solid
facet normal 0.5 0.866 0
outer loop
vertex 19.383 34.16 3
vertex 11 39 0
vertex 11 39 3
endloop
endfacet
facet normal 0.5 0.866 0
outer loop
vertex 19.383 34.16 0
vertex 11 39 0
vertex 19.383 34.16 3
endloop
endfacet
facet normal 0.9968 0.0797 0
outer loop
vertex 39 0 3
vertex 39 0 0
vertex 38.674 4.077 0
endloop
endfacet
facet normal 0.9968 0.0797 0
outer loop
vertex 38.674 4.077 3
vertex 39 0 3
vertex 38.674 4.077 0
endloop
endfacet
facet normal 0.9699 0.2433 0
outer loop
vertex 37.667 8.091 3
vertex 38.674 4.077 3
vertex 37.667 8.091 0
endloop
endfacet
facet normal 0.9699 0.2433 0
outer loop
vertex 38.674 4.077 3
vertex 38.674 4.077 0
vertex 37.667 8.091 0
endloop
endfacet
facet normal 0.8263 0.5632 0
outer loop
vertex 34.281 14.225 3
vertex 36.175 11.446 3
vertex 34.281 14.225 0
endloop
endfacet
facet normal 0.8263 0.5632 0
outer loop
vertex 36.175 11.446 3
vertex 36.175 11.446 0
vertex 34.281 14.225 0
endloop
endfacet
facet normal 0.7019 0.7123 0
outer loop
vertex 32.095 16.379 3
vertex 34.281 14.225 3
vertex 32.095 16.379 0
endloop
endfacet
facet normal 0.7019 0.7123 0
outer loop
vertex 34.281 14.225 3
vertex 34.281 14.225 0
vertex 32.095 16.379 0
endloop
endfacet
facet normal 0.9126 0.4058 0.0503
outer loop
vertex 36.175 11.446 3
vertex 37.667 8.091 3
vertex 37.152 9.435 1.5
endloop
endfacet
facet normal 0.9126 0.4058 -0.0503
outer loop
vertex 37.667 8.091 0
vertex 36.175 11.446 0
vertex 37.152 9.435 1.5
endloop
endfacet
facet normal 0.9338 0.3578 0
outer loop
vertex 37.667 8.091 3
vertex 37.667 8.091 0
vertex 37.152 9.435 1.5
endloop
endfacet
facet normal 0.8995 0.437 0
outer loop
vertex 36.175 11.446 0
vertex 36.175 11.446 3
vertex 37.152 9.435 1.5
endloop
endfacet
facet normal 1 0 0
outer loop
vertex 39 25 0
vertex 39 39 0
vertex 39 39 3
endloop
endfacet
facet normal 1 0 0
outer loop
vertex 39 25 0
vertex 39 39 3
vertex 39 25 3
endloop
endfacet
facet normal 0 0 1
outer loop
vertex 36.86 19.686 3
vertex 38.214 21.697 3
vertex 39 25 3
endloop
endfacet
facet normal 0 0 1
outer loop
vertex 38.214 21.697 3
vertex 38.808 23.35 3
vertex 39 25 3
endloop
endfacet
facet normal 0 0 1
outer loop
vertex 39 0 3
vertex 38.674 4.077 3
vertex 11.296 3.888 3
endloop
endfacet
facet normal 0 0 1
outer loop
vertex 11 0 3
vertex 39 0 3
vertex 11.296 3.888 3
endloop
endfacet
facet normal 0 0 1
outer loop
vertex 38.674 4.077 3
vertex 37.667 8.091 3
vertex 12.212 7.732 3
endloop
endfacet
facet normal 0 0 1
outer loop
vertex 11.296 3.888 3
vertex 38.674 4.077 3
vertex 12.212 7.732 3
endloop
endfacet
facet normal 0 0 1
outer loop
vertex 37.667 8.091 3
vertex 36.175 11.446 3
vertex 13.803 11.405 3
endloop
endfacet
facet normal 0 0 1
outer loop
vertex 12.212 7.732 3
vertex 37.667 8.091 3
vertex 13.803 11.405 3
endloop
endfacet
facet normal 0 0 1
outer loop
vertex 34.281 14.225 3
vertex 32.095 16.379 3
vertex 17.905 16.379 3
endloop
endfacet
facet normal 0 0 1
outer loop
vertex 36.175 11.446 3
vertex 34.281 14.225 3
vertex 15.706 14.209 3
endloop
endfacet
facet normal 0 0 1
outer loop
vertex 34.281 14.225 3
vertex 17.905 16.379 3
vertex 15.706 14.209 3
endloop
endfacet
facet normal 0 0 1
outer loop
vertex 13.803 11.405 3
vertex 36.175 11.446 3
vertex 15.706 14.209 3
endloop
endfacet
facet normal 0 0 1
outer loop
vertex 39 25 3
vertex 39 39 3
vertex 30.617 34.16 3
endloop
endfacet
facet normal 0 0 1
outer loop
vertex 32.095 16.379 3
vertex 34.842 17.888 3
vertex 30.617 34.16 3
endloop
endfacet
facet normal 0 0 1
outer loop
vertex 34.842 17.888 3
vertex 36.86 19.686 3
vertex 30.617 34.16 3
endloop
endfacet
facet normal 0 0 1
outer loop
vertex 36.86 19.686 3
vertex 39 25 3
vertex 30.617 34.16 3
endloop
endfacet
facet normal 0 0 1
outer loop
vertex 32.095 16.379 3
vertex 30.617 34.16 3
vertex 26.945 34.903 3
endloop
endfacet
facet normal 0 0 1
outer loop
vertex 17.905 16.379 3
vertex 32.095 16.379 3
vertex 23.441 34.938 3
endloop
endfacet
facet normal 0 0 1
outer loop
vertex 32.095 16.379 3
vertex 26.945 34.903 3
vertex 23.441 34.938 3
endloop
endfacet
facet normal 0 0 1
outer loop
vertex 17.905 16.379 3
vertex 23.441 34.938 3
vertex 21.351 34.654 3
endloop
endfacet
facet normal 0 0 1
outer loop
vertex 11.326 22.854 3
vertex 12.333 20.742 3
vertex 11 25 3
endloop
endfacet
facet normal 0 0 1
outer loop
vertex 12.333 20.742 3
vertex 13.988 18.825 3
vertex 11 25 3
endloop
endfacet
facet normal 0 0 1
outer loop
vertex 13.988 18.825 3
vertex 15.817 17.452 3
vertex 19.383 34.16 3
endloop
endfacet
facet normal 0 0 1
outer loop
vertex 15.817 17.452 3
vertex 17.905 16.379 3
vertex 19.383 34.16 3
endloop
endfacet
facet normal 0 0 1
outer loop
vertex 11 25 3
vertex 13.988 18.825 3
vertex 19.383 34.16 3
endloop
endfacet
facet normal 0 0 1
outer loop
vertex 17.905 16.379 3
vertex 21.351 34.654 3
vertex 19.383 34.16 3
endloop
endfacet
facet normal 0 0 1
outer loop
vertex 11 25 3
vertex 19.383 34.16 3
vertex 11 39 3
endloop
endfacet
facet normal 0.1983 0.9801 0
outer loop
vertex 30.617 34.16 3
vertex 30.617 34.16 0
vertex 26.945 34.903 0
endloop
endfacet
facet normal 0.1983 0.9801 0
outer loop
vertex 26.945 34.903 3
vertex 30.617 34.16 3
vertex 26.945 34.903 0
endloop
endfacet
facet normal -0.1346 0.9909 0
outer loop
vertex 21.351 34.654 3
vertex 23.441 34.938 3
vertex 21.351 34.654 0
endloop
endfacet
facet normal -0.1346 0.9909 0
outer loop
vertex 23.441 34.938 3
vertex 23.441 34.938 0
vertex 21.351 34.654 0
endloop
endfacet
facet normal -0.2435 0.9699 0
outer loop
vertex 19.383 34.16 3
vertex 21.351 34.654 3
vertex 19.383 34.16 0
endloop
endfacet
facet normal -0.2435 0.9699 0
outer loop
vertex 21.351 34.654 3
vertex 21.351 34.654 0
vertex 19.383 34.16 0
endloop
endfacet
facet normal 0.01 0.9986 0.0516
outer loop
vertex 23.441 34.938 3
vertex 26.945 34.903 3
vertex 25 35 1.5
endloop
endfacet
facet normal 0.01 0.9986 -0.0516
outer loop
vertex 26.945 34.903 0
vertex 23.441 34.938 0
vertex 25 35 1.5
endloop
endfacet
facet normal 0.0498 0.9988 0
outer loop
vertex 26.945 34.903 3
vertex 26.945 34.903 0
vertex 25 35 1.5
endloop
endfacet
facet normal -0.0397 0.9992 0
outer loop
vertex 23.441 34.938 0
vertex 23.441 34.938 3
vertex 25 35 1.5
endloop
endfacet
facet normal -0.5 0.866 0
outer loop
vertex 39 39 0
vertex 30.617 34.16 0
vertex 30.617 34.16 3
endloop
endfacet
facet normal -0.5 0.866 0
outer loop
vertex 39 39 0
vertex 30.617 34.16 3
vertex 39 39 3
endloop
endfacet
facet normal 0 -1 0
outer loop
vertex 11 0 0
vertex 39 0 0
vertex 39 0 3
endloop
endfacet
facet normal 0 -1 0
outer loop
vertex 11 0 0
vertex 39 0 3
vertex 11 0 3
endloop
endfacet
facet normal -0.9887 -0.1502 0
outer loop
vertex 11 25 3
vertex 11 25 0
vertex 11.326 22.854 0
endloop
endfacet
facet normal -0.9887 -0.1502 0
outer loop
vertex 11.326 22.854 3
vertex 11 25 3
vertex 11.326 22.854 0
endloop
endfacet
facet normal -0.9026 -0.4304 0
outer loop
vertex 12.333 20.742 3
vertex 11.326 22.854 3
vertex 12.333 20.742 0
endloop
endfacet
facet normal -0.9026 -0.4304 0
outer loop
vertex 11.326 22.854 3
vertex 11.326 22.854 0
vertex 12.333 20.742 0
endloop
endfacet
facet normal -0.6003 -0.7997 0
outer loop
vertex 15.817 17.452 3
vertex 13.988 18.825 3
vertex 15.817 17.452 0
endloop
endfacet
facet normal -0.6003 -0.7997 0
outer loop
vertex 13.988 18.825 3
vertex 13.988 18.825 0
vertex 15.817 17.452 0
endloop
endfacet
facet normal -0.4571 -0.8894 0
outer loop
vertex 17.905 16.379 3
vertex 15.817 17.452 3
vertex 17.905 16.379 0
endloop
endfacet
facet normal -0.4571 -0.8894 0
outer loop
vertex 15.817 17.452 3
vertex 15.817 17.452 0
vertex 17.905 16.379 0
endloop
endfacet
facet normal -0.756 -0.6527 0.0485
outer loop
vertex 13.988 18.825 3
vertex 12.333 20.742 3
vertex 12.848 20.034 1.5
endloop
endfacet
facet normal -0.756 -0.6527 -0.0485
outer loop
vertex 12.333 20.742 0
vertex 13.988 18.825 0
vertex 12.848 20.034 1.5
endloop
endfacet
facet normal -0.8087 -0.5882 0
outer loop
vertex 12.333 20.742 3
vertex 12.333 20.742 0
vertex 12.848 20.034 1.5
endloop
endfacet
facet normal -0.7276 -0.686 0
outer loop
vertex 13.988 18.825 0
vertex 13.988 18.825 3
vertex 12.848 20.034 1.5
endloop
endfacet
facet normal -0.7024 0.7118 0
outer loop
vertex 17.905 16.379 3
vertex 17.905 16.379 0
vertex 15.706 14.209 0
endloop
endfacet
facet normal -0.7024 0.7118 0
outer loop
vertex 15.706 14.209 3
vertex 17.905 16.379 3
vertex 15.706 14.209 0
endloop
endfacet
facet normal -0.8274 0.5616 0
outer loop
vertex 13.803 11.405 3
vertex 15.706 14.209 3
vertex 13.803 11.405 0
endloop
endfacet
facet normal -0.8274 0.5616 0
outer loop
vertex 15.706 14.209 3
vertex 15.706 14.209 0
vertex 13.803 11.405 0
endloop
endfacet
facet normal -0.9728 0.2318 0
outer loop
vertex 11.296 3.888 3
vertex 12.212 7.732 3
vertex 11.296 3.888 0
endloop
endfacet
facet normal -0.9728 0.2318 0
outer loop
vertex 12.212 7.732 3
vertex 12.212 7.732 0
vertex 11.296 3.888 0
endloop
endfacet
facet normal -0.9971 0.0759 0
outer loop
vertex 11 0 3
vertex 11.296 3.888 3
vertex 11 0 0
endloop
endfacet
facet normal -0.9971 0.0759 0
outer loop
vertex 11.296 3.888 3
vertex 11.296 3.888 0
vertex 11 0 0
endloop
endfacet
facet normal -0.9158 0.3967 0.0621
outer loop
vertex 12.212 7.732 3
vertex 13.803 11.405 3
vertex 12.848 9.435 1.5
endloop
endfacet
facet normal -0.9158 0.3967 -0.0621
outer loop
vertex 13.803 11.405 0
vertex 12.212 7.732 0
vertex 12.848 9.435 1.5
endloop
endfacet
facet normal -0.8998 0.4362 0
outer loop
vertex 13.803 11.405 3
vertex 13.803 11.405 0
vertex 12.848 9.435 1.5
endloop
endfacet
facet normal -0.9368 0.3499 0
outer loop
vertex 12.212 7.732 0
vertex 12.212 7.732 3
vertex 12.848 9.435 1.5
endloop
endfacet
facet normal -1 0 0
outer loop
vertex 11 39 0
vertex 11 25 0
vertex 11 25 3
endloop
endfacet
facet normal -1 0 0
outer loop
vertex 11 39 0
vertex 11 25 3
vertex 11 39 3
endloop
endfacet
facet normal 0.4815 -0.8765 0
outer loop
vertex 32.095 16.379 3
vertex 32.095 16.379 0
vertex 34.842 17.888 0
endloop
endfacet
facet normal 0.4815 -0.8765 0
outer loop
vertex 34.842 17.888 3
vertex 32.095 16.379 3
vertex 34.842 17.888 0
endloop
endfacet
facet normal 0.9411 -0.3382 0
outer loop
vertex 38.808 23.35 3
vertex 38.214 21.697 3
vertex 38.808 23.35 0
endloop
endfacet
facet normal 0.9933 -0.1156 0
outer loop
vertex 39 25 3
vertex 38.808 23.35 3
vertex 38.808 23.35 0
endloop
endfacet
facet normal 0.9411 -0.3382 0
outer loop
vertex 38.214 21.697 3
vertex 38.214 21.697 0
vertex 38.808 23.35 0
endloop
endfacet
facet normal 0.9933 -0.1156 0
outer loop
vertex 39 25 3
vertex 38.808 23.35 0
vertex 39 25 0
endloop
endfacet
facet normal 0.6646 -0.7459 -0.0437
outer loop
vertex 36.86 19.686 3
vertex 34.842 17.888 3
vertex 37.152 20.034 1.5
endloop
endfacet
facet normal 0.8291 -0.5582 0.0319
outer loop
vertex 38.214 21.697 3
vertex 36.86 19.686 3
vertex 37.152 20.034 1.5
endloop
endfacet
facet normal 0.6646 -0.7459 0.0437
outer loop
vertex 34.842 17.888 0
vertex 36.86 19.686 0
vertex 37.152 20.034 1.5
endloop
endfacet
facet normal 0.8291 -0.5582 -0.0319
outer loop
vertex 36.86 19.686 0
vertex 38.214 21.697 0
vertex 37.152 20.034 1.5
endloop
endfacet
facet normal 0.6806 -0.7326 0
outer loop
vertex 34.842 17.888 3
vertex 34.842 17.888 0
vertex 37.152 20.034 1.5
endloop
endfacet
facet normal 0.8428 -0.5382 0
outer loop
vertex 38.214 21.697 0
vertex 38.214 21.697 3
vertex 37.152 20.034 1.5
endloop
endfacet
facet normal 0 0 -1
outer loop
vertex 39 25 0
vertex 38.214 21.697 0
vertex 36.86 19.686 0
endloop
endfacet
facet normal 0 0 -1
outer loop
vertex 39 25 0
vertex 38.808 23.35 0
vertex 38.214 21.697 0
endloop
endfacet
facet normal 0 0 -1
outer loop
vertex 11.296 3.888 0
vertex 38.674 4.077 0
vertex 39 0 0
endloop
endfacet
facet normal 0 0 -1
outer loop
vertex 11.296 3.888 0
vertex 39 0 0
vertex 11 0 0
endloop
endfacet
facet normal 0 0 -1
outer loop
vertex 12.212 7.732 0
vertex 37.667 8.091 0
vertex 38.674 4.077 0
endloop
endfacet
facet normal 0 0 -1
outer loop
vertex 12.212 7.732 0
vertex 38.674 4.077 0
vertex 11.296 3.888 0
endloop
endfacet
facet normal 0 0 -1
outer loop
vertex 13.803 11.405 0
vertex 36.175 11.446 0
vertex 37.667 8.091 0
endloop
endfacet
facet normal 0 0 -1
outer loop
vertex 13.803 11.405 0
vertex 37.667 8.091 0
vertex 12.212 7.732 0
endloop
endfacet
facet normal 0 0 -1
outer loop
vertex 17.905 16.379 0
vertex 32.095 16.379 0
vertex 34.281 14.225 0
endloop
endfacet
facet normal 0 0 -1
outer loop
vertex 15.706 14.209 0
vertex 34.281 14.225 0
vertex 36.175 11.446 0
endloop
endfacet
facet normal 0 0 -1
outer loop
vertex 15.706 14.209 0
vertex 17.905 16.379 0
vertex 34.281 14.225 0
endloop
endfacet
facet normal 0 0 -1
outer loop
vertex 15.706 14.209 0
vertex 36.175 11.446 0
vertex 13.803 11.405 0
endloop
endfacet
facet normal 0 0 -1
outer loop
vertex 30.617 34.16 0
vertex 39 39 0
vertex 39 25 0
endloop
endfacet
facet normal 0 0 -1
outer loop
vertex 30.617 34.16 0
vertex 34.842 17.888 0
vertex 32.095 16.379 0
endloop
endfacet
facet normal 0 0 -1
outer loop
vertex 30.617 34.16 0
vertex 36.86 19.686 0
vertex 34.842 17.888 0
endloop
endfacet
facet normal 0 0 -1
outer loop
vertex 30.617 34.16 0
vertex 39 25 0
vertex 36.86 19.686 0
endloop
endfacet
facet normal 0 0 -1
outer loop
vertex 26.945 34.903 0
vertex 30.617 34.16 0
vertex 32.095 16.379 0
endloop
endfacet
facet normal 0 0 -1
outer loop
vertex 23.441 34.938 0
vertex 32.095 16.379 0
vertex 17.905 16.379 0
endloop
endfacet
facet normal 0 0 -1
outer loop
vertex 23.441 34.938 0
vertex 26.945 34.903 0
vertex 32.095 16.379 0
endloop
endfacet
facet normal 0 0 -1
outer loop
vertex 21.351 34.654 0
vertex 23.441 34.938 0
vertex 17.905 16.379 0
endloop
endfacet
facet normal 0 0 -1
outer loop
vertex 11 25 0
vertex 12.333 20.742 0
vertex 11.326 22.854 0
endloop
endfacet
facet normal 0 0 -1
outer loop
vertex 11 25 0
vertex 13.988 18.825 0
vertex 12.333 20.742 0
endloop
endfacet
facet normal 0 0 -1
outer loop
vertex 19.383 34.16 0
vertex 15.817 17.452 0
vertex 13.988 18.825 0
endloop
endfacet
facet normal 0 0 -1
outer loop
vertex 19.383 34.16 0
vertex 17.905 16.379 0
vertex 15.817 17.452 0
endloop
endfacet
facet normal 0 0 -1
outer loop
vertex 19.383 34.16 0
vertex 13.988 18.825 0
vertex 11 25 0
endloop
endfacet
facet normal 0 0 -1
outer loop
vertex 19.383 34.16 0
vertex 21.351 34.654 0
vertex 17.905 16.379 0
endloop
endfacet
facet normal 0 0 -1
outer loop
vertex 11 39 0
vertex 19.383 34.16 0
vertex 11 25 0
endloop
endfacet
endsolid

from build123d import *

# Parameters (mm, degrees)
SALIENTE_EXTRUIR2_DEPTH = 3


with BuildPart() as part:
    # Croquis1 → Saliente-Extruir2 (new body)
    with BuildSketch(Plane.XY):
        with BuildLine():
            Line((11, 25), (11, 39))
            Line((11, 39), (19.383258886, 34.159923226))
            add(Edge.make_bspline(
                [(30.616741114, 34.159923226), (25, 35.917122069), (19.383258886, 34.159923226)],
                knots=[4.299567044, 4.299567044, 4.299567044, 5.125210917, 5.125210917, 5.125210917], degree=2, weights=[1, 0.915992323, 1]))
            Line((30.616741114, 34.159923226), (39, 39))
            Line((39, 39), (39, 25))
            add(Edge.make_bspline(
                [(32.095073738, 16.379310345), (39, 19.278775383), (39, 25)],
                knots=[2.102254565, 2.102254565, 2.102254565, 3.141592654, 3.141592654, 3.141592654], degree=2, weights=[1, 0.867983577, 1]))
            add(Edge.make_bspline(
                [(39, 0), (39, 10.870326773), (32.095073738, 16.379310345)],
                knots=[4.71238898, 4.71238898, 4.71238898, 5.751727069, 5.751727069, 5.751727069], degree=2, weights=[1, 0.867983577, 1]))
            Line((39, 0), (11, 0))
            add(Edge.make_bspline(
                [(17.904926262, 16.379310345), (11, 10.870326773), (11, 0)],
                knots=[0.531458238, 0.531458238, 0.531458238, 1.570796327, 1.570796327, 1.570796327], degree=2, weights=[1, 0.867983577, 1]))
            add(Edge.make_bspline(
                [(11, 25), (11, 19.278775383), (17.904926262, 16.379310345)],
                knots=[0, 0, 0, 1.039338089, 1.039338089, 1.039338089], degree=2, weights=[1, 0.867983577, 1]))
        make_face()
    extrude(amount=SALIENTE_EXTRUIR2_DEPTH)


solid = part.part
